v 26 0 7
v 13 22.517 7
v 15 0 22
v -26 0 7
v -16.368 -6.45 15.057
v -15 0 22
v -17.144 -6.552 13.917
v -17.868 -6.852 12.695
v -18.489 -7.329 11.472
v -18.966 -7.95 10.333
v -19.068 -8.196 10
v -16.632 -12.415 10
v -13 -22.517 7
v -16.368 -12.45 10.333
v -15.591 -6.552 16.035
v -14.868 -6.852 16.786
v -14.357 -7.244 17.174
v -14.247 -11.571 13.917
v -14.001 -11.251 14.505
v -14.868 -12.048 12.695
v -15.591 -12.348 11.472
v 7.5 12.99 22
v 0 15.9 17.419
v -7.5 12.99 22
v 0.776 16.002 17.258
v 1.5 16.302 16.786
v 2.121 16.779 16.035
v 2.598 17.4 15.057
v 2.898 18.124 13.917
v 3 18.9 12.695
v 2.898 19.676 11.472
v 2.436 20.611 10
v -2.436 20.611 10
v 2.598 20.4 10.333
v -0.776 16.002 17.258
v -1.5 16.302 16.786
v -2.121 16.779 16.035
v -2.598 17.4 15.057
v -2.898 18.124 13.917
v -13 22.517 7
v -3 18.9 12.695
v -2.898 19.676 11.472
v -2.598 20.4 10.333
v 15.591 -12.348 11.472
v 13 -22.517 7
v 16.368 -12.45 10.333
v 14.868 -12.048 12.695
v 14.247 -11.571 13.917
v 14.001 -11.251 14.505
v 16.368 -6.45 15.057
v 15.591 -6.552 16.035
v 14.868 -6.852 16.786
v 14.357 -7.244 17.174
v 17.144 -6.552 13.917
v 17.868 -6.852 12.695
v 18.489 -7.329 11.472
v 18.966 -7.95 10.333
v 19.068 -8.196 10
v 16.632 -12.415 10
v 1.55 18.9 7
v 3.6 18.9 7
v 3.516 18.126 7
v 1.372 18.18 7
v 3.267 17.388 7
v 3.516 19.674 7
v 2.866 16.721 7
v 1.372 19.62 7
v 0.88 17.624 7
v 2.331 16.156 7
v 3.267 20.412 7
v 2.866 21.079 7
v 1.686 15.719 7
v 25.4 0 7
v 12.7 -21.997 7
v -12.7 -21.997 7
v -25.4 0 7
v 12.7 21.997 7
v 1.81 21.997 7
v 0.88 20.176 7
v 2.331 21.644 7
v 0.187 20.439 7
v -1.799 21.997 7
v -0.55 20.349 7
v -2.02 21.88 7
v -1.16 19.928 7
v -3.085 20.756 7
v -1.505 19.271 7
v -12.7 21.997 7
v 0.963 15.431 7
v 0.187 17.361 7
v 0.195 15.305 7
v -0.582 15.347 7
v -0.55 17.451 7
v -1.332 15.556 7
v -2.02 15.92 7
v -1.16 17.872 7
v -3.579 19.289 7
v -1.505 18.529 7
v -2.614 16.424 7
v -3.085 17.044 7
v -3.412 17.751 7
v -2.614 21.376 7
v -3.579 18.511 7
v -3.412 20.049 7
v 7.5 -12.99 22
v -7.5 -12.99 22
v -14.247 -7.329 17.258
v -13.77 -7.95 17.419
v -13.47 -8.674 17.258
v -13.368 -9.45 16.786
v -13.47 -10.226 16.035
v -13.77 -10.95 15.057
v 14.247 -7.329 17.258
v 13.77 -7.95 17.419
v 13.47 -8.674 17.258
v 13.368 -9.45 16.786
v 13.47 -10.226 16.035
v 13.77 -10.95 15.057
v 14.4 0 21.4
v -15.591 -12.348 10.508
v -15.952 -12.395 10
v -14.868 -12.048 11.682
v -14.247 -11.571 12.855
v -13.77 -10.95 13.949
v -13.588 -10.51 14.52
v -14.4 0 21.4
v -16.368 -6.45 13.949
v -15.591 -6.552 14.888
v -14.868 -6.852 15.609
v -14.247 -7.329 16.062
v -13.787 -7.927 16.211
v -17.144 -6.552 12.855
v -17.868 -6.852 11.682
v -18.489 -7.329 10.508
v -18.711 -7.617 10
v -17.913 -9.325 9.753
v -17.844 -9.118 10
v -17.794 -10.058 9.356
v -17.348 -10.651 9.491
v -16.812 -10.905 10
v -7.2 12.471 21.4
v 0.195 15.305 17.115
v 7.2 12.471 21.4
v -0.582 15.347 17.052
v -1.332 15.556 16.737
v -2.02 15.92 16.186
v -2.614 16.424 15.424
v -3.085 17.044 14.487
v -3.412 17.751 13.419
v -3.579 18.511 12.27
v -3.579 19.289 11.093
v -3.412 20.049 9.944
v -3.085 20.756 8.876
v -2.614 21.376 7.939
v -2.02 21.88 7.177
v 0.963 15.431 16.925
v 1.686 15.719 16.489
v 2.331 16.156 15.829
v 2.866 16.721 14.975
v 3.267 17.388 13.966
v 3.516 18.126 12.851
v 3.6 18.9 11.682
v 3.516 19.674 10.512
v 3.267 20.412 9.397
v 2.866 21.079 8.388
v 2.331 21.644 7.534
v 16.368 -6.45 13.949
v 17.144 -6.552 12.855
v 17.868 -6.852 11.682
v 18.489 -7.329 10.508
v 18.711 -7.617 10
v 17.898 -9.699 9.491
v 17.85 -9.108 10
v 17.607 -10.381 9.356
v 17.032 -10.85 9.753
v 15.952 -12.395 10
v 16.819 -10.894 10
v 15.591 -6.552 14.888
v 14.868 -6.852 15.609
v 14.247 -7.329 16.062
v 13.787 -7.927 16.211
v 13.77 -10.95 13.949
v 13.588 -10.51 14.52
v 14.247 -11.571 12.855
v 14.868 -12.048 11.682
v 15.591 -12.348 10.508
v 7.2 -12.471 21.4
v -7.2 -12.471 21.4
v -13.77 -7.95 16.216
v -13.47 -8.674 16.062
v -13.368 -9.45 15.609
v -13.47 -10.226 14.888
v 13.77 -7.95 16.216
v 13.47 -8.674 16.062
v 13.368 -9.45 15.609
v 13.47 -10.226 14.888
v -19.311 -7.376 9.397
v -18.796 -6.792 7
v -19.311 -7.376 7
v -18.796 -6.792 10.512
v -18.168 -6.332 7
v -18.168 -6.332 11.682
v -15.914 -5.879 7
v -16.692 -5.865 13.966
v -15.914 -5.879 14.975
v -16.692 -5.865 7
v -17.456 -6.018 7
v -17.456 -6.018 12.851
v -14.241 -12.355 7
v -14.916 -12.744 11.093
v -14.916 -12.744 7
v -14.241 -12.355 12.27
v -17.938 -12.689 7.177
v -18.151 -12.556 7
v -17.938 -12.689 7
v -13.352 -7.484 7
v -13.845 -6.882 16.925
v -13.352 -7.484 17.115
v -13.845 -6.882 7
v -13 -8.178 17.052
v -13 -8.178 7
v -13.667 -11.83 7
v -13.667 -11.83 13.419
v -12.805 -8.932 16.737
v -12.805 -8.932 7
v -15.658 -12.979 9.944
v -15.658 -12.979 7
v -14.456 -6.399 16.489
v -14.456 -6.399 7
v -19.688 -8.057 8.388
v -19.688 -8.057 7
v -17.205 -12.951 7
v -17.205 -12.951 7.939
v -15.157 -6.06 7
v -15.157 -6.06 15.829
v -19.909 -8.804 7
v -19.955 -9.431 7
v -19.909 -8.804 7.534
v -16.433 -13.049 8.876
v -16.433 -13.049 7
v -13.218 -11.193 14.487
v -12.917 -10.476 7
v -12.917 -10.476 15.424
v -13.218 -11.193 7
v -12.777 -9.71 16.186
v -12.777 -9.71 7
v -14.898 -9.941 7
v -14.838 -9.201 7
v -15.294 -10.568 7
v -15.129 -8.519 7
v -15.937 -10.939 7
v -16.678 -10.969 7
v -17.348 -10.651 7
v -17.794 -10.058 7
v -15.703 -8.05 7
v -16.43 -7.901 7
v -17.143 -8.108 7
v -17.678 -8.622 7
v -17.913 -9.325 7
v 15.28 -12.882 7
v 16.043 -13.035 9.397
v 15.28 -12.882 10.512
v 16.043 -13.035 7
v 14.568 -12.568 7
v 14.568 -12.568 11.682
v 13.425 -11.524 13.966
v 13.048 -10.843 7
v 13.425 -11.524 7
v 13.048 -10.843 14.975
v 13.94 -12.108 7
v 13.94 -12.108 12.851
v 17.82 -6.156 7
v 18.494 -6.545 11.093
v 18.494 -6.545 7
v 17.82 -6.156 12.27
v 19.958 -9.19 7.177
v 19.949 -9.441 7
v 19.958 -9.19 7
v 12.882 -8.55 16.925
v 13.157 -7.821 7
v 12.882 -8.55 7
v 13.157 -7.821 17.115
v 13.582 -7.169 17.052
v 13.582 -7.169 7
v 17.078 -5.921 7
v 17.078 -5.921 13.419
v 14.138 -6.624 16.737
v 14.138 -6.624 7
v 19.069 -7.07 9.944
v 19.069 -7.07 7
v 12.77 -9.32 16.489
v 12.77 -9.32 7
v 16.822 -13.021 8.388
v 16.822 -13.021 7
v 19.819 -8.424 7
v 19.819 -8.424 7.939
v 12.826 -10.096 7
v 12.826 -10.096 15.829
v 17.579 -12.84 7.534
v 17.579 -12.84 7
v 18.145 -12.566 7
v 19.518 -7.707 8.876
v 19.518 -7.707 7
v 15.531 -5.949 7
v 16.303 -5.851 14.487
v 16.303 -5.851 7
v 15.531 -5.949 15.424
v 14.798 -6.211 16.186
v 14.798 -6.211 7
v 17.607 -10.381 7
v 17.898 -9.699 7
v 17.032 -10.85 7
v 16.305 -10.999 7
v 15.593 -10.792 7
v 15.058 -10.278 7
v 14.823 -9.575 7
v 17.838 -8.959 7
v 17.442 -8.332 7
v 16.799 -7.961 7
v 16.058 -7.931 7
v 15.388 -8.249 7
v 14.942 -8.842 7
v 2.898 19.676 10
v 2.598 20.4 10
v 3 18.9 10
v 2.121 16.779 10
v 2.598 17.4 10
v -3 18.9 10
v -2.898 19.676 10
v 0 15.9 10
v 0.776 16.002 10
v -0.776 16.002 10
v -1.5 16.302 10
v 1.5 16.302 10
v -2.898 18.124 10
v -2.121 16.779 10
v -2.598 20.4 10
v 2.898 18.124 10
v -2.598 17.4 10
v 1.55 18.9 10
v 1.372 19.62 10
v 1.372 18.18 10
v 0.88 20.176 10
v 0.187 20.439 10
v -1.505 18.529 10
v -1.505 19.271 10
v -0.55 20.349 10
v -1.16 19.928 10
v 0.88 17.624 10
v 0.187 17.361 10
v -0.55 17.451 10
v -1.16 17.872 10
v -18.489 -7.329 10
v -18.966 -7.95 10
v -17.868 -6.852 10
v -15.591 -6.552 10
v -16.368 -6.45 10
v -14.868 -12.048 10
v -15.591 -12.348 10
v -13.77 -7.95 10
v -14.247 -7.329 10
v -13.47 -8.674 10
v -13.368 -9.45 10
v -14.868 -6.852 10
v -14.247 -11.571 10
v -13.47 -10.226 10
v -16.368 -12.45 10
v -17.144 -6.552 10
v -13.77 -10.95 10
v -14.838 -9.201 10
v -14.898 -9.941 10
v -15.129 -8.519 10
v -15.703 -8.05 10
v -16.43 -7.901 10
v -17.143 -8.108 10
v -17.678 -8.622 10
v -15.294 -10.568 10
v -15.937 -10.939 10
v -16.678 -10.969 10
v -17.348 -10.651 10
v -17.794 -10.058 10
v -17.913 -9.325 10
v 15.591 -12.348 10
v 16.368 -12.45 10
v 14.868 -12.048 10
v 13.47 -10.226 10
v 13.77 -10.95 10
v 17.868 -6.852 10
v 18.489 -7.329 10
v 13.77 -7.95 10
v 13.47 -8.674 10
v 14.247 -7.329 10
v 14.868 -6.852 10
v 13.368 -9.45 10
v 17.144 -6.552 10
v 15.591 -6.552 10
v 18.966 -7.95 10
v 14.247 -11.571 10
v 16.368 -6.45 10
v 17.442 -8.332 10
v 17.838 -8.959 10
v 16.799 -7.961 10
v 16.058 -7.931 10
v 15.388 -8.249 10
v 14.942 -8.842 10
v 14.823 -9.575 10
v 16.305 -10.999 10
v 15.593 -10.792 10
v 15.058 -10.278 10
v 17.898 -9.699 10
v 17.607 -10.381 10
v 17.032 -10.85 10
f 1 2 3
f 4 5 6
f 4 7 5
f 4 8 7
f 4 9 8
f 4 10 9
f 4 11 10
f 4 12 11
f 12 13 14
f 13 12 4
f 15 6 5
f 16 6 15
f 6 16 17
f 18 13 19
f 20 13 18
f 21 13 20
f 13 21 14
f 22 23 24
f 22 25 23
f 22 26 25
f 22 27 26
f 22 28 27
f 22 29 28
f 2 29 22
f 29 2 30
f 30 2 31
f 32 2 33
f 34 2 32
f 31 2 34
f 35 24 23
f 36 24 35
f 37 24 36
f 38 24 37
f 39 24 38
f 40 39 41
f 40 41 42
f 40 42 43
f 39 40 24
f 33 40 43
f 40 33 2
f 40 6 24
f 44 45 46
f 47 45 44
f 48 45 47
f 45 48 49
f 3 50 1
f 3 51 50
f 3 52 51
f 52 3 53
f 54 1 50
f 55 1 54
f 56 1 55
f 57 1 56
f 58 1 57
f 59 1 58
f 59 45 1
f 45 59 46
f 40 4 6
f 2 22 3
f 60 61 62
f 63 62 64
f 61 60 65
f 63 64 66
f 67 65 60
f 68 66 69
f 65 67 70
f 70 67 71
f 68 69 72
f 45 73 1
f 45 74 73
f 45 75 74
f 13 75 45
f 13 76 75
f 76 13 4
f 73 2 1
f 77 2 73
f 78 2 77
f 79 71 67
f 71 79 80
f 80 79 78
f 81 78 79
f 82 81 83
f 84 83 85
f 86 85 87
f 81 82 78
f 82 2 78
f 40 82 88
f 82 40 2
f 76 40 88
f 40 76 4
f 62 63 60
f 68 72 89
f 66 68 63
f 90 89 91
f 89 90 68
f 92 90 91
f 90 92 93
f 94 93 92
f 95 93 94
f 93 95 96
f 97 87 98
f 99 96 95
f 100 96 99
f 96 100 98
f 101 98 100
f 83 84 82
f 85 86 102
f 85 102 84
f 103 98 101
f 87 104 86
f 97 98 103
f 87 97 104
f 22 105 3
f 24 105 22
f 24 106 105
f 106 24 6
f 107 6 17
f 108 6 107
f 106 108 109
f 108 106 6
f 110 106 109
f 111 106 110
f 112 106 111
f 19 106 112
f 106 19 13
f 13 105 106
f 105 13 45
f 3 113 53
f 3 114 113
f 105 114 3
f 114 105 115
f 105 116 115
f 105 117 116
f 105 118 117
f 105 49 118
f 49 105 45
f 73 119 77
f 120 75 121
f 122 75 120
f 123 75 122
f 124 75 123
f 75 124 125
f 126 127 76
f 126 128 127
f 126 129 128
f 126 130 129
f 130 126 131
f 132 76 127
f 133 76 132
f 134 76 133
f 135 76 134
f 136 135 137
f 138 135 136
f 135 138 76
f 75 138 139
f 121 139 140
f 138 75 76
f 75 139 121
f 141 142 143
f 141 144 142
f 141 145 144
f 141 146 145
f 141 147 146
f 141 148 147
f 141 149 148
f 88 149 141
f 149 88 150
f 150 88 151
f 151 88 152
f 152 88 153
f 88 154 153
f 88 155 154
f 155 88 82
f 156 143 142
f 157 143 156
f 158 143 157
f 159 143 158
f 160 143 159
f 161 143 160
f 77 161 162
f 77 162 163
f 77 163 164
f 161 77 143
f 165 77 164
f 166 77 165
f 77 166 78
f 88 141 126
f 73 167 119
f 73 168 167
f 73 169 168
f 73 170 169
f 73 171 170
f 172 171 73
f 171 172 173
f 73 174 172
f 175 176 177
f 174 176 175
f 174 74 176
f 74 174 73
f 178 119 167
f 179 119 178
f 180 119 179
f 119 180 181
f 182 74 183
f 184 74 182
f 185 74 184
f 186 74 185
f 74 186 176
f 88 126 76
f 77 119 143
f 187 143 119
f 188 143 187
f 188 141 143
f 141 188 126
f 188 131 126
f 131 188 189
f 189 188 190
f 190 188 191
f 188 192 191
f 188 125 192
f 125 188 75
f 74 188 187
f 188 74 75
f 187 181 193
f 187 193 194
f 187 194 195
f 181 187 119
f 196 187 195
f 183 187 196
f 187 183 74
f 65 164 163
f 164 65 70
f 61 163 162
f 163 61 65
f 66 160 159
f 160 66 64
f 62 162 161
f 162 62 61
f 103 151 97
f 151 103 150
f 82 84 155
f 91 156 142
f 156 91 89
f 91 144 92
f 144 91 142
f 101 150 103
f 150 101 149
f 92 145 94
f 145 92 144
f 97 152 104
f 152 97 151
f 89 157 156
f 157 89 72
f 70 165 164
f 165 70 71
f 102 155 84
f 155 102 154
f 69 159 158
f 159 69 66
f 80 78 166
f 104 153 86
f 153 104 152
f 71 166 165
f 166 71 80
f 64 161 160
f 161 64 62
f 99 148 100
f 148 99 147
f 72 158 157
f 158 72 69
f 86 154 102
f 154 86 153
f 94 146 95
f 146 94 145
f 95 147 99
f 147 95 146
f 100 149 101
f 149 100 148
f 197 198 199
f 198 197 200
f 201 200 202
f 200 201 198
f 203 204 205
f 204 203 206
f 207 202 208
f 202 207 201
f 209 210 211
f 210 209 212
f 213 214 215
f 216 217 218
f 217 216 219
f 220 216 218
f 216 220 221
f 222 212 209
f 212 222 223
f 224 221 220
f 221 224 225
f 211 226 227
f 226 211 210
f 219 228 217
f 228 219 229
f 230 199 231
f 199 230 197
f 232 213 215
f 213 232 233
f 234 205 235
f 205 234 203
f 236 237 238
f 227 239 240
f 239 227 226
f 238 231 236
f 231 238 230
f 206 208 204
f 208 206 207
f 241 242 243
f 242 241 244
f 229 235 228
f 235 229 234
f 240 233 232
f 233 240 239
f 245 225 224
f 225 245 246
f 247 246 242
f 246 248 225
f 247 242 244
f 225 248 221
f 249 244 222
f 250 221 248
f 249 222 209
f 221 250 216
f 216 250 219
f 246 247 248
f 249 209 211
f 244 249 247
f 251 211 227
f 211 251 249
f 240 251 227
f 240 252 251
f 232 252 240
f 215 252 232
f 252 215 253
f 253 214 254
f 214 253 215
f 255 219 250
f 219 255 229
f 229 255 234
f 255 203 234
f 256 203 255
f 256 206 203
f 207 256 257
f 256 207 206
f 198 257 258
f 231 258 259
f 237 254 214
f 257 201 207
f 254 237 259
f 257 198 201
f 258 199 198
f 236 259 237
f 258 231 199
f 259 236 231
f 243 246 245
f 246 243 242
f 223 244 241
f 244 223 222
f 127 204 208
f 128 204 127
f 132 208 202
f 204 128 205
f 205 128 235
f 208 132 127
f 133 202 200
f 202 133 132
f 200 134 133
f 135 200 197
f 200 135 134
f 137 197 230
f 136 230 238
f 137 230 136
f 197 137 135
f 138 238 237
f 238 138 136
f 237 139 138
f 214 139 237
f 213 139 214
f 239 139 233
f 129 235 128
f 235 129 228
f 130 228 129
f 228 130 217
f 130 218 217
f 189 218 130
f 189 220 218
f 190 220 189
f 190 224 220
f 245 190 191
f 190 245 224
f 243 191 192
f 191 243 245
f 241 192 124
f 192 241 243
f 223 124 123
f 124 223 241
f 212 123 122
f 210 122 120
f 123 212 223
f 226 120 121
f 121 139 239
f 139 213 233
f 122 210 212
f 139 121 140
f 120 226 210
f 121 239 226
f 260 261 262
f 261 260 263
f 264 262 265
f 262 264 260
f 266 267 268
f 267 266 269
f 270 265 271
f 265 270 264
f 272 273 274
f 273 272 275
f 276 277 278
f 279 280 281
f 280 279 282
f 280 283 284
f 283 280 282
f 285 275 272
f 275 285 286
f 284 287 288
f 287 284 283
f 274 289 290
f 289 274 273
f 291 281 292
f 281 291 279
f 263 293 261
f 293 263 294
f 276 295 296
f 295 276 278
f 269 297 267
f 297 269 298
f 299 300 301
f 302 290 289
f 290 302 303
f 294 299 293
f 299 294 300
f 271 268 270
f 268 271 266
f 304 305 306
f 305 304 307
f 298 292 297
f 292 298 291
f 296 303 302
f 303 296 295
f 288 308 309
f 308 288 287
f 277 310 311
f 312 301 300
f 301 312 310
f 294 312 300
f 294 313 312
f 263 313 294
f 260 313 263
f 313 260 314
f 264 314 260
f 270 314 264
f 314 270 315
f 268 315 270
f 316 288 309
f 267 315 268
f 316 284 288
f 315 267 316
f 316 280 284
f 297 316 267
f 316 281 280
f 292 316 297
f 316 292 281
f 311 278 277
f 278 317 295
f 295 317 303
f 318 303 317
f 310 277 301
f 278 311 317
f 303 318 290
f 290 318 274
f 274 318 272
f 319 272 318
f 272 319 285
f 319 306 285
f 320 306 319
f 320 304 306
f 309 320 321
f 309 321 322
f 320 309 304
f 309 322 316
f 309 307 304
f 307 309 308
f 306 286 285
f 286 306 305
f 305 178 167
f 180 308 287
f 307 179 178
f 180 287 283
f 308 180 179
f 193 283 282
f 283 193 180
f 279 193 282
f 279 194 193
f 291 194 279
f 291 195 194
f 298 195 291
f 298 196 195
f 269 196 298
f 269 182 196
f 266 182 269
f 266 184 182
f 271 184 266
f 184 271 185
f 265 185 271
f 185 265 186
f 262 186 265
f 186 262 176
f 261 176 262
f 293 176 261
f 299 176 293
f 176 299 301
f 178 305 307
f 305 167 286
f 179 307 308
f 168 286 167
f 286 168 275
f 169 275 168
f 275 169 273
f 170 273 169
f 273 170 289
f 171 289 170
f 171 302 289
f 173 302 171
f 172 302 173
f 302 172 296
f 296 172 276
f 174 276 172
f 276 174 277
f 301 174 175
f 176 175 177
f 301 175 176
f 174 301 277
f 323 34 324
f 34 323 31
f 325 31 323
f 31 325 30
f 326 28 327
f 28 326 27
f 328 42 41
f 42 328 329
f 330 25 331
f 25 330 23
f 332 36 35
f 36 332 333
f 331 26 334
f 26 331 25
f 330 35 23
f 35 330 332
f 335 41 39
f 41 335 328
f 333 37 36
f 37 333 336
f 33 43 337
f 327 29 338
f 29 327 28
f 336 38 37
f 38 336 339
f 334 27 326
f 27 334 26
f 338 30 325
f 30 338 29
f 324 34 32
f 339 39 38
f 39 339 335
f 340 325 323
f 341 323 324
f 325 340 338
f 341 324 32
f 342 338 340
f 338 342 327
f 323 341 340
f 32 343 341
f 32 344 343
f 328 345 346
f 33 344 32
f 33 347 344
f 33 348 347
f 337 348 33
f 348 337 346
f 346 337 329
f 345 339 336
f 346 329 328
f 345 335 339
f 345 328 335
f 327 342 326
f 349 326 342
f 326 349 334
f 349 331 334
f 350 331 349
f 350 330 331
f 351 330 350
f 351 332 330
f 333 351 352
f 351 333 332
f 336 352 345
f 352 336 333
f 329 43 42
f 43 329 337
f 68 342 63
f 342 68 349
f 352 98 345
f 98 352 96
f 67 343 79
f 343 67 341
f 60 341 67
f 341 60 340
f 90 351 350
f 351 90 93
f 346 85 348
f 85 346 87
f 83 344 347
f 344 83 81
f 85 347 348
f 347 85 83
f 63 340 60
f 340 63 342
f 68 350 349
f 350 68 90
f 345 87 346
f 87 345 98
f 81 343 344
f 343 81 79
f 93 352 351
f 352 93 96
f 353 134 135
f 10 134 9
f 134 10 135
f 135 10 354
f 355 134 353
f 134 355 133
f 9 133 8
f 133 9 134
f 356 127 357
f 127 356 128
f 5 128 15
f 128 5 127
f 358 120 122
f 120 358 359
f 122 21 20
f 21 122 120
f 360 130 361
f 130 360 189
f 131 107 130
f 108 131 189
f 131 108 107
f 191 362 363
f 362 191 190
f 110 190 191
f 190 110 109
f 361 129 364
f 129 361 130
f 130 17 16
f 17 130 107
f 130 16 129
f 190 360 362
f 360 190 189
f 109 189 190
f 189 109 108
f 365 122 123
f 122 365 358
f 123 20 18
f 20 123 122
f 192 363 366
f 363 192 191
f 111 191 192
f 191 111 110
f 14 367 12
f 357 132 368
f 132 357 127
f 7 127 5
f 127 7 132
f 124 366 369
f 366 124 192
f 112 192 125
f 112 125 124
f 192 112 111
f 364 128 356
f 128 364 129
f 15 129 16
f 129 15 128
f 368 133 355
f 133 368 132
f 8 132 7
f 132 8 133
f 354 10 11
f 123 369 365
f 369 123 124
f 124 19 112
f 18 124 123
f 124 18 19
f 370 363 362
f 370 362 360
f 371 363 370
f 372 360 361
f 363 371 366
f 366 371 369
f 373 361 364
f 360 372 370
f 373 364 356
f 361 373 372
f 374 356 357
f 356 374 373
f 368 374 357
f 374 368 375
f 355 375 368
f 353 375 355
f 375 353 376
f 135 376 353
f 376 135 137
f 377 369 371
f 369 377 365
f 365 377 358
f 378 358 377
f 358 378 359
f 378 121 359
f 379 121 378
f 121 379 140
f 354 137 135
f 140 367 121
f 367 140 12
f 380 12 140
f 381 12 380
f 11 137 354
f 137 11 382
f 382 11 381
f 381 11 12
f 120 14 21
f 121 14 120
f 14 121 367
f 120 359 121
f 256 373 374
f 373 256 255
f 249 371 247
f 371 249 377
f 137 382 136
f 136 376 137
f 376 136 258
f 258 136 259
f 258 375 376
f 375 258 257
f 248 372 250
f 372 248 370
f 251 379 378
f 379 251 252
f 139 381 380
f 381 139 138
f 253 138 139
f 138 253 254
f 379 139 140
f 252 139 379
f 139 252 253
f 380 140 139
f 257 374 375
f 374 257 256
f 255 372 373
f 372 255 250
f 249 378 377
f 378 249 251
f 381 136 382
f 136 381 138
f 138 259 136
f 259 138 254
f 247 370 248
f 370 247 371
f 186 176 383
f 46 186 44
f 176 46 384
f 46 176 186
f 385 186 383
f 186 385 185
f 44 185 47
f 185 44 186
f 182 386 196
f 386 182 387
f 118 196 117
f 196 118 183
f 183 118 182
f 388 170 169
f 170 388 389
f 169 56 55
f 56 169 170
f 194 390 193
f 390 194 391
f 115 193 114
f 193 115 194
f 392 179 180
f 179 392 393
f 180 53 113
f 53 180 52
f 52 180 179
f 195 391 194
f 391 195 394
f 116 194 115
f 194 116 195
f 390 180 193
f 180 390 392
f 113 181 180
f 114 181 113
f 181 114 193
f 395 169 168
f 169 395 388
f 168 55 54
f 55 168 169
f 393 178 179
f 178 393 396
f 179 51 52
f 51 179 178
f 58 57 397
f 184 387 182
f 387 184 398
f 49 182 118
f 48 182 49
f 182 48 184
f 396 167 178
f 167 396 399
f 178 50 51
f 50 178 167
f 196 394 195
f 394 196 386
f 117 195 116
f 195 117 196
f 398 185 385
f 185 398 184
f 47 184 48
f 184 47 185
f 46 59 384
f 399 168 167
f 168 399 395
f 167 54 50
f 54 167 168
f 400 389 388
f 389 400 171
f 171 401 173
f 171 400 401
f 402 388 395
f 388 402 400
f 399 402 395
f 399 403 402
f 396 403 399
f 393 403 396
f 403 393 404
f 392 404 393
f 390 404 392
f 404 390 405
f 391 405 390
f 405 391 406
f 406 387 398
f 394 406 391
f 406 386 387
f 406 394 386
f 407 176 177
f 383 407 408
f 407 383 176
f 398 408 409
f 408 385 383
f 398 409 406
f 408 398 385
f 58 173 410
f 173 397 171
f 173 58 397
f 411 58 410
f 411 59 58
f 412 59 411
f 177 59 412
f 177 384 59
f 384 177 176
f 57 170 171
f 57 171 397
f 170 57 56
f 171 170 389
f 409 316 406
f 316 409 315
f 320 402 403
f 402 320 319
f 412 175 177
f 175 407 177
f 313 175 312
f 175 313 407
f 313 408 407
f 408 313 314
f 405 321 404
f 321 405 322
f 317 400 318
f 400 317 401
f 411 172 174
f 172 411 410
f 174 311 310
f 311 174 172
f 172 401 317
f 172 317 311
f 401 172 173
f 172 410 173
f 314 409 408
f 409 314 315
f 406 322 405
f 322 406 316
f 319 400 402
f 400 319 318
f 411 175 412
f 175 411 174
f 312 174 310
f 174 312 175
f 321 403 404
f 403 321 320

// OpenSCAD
$fs = 0.8;

$wallThickness = 0.6;

casingBottomRadius 	= 26;
casingTopRadius 		= 15;
casingHeight 			= 22 - 7;
	

screwHead = 6;
screwRadius = casingBottomRadius - 5;

module casing_shell_inner() {
	$fn = 6;
	cylinder(r1 = casingBottomRadius - $wallThickness,
					r2 = casingTopRadius - $wallThickness,
					h  = casingHeight - $wallThickness);
}

module casing_shell() {
	difference() {
		$fn = 6;
		cylinder(r1 = casingBottomRadius, r2 = casingTopRadius, h = casingHeight);
		casing_shell_inner();
	}
}
		

module casing_screw_negative(position) {
	translate(position + [0, 0, 3]) cylinder(d = screwHead, h = $wallThickness + 10.001);
	translate(position - [0, 0, 10]) cylinder(d = 3.1, h = 100);
}

module casing_screw_positive(position) {
	intersection() {
		translate(position) cylinder(d = screwHead + $wallThickness*2, h = 100);
		casing_shell_inner();
	}
}

module casing_with_screws() {
	difference() {
		union() {
			casing_shell();
			for(i=[0:120:360]) rotate([0, 0, i]) casing_screw_positive([0, -1.5 - $wallThickness + screwRadius, 0]);
		}
		for(i=[0:120:360]) rotate([0, 0, i])
		casing_screw_negative([0, -1.5 - $wallThickness + screwRadius, 0]);
	}
}

module electronics_holder() {
	elX = 24.36; 
	elY = 19;

	zUp = 2 + $wallThickness;
	
	$wallThickness = 0.6;
	
	translate([elX + $wallThickness *2, elY + $wallThickness *2, 0] /-2)
	difference() {
		cube([elX + $wallThickness *2, elY + $wallThickness *2, zUp + $wallThickness]);
		translate([$wallThickness*2, $wallThickness*2, 0]) cube([elX - $wallThickness*2, elY - $wallThickness*2, zUp + $wallThickness]);
		translate([$wallThickness, $wallThickness, zUp]) cube([elX, elY, 100]);
	}
}

module casing_bottom() {
	difference() {
		union() {
			$fn = 6;
			cylinder(r = casingBottomRadius, h = $wallThickness);
			
			difference() {
				cylinder(r = casingBottomRadius, h = 7);
				cylinder(r = casingBottomRadius - $wallThickness, h = 8);
			}
			
			for(i=[0:120:360]) rotate([0, 0, i]) translate([0, -1.5 - $wallThickness + screwRadius]) 			cylinder(d = screwHead, h = 7, $fn = 13);
		}
		for(i=[0:120:360]) rotate([0, 0, i]) translate([0, -1.5 - $wallThickness + screwRadius])
			cylinder(d = 3.1, h = 7);
	}
}


translate([0, 0, 7]) casing_with_screws();
%rotate([0, 0, 30]) electronics_holder();
%casing_bottom();
